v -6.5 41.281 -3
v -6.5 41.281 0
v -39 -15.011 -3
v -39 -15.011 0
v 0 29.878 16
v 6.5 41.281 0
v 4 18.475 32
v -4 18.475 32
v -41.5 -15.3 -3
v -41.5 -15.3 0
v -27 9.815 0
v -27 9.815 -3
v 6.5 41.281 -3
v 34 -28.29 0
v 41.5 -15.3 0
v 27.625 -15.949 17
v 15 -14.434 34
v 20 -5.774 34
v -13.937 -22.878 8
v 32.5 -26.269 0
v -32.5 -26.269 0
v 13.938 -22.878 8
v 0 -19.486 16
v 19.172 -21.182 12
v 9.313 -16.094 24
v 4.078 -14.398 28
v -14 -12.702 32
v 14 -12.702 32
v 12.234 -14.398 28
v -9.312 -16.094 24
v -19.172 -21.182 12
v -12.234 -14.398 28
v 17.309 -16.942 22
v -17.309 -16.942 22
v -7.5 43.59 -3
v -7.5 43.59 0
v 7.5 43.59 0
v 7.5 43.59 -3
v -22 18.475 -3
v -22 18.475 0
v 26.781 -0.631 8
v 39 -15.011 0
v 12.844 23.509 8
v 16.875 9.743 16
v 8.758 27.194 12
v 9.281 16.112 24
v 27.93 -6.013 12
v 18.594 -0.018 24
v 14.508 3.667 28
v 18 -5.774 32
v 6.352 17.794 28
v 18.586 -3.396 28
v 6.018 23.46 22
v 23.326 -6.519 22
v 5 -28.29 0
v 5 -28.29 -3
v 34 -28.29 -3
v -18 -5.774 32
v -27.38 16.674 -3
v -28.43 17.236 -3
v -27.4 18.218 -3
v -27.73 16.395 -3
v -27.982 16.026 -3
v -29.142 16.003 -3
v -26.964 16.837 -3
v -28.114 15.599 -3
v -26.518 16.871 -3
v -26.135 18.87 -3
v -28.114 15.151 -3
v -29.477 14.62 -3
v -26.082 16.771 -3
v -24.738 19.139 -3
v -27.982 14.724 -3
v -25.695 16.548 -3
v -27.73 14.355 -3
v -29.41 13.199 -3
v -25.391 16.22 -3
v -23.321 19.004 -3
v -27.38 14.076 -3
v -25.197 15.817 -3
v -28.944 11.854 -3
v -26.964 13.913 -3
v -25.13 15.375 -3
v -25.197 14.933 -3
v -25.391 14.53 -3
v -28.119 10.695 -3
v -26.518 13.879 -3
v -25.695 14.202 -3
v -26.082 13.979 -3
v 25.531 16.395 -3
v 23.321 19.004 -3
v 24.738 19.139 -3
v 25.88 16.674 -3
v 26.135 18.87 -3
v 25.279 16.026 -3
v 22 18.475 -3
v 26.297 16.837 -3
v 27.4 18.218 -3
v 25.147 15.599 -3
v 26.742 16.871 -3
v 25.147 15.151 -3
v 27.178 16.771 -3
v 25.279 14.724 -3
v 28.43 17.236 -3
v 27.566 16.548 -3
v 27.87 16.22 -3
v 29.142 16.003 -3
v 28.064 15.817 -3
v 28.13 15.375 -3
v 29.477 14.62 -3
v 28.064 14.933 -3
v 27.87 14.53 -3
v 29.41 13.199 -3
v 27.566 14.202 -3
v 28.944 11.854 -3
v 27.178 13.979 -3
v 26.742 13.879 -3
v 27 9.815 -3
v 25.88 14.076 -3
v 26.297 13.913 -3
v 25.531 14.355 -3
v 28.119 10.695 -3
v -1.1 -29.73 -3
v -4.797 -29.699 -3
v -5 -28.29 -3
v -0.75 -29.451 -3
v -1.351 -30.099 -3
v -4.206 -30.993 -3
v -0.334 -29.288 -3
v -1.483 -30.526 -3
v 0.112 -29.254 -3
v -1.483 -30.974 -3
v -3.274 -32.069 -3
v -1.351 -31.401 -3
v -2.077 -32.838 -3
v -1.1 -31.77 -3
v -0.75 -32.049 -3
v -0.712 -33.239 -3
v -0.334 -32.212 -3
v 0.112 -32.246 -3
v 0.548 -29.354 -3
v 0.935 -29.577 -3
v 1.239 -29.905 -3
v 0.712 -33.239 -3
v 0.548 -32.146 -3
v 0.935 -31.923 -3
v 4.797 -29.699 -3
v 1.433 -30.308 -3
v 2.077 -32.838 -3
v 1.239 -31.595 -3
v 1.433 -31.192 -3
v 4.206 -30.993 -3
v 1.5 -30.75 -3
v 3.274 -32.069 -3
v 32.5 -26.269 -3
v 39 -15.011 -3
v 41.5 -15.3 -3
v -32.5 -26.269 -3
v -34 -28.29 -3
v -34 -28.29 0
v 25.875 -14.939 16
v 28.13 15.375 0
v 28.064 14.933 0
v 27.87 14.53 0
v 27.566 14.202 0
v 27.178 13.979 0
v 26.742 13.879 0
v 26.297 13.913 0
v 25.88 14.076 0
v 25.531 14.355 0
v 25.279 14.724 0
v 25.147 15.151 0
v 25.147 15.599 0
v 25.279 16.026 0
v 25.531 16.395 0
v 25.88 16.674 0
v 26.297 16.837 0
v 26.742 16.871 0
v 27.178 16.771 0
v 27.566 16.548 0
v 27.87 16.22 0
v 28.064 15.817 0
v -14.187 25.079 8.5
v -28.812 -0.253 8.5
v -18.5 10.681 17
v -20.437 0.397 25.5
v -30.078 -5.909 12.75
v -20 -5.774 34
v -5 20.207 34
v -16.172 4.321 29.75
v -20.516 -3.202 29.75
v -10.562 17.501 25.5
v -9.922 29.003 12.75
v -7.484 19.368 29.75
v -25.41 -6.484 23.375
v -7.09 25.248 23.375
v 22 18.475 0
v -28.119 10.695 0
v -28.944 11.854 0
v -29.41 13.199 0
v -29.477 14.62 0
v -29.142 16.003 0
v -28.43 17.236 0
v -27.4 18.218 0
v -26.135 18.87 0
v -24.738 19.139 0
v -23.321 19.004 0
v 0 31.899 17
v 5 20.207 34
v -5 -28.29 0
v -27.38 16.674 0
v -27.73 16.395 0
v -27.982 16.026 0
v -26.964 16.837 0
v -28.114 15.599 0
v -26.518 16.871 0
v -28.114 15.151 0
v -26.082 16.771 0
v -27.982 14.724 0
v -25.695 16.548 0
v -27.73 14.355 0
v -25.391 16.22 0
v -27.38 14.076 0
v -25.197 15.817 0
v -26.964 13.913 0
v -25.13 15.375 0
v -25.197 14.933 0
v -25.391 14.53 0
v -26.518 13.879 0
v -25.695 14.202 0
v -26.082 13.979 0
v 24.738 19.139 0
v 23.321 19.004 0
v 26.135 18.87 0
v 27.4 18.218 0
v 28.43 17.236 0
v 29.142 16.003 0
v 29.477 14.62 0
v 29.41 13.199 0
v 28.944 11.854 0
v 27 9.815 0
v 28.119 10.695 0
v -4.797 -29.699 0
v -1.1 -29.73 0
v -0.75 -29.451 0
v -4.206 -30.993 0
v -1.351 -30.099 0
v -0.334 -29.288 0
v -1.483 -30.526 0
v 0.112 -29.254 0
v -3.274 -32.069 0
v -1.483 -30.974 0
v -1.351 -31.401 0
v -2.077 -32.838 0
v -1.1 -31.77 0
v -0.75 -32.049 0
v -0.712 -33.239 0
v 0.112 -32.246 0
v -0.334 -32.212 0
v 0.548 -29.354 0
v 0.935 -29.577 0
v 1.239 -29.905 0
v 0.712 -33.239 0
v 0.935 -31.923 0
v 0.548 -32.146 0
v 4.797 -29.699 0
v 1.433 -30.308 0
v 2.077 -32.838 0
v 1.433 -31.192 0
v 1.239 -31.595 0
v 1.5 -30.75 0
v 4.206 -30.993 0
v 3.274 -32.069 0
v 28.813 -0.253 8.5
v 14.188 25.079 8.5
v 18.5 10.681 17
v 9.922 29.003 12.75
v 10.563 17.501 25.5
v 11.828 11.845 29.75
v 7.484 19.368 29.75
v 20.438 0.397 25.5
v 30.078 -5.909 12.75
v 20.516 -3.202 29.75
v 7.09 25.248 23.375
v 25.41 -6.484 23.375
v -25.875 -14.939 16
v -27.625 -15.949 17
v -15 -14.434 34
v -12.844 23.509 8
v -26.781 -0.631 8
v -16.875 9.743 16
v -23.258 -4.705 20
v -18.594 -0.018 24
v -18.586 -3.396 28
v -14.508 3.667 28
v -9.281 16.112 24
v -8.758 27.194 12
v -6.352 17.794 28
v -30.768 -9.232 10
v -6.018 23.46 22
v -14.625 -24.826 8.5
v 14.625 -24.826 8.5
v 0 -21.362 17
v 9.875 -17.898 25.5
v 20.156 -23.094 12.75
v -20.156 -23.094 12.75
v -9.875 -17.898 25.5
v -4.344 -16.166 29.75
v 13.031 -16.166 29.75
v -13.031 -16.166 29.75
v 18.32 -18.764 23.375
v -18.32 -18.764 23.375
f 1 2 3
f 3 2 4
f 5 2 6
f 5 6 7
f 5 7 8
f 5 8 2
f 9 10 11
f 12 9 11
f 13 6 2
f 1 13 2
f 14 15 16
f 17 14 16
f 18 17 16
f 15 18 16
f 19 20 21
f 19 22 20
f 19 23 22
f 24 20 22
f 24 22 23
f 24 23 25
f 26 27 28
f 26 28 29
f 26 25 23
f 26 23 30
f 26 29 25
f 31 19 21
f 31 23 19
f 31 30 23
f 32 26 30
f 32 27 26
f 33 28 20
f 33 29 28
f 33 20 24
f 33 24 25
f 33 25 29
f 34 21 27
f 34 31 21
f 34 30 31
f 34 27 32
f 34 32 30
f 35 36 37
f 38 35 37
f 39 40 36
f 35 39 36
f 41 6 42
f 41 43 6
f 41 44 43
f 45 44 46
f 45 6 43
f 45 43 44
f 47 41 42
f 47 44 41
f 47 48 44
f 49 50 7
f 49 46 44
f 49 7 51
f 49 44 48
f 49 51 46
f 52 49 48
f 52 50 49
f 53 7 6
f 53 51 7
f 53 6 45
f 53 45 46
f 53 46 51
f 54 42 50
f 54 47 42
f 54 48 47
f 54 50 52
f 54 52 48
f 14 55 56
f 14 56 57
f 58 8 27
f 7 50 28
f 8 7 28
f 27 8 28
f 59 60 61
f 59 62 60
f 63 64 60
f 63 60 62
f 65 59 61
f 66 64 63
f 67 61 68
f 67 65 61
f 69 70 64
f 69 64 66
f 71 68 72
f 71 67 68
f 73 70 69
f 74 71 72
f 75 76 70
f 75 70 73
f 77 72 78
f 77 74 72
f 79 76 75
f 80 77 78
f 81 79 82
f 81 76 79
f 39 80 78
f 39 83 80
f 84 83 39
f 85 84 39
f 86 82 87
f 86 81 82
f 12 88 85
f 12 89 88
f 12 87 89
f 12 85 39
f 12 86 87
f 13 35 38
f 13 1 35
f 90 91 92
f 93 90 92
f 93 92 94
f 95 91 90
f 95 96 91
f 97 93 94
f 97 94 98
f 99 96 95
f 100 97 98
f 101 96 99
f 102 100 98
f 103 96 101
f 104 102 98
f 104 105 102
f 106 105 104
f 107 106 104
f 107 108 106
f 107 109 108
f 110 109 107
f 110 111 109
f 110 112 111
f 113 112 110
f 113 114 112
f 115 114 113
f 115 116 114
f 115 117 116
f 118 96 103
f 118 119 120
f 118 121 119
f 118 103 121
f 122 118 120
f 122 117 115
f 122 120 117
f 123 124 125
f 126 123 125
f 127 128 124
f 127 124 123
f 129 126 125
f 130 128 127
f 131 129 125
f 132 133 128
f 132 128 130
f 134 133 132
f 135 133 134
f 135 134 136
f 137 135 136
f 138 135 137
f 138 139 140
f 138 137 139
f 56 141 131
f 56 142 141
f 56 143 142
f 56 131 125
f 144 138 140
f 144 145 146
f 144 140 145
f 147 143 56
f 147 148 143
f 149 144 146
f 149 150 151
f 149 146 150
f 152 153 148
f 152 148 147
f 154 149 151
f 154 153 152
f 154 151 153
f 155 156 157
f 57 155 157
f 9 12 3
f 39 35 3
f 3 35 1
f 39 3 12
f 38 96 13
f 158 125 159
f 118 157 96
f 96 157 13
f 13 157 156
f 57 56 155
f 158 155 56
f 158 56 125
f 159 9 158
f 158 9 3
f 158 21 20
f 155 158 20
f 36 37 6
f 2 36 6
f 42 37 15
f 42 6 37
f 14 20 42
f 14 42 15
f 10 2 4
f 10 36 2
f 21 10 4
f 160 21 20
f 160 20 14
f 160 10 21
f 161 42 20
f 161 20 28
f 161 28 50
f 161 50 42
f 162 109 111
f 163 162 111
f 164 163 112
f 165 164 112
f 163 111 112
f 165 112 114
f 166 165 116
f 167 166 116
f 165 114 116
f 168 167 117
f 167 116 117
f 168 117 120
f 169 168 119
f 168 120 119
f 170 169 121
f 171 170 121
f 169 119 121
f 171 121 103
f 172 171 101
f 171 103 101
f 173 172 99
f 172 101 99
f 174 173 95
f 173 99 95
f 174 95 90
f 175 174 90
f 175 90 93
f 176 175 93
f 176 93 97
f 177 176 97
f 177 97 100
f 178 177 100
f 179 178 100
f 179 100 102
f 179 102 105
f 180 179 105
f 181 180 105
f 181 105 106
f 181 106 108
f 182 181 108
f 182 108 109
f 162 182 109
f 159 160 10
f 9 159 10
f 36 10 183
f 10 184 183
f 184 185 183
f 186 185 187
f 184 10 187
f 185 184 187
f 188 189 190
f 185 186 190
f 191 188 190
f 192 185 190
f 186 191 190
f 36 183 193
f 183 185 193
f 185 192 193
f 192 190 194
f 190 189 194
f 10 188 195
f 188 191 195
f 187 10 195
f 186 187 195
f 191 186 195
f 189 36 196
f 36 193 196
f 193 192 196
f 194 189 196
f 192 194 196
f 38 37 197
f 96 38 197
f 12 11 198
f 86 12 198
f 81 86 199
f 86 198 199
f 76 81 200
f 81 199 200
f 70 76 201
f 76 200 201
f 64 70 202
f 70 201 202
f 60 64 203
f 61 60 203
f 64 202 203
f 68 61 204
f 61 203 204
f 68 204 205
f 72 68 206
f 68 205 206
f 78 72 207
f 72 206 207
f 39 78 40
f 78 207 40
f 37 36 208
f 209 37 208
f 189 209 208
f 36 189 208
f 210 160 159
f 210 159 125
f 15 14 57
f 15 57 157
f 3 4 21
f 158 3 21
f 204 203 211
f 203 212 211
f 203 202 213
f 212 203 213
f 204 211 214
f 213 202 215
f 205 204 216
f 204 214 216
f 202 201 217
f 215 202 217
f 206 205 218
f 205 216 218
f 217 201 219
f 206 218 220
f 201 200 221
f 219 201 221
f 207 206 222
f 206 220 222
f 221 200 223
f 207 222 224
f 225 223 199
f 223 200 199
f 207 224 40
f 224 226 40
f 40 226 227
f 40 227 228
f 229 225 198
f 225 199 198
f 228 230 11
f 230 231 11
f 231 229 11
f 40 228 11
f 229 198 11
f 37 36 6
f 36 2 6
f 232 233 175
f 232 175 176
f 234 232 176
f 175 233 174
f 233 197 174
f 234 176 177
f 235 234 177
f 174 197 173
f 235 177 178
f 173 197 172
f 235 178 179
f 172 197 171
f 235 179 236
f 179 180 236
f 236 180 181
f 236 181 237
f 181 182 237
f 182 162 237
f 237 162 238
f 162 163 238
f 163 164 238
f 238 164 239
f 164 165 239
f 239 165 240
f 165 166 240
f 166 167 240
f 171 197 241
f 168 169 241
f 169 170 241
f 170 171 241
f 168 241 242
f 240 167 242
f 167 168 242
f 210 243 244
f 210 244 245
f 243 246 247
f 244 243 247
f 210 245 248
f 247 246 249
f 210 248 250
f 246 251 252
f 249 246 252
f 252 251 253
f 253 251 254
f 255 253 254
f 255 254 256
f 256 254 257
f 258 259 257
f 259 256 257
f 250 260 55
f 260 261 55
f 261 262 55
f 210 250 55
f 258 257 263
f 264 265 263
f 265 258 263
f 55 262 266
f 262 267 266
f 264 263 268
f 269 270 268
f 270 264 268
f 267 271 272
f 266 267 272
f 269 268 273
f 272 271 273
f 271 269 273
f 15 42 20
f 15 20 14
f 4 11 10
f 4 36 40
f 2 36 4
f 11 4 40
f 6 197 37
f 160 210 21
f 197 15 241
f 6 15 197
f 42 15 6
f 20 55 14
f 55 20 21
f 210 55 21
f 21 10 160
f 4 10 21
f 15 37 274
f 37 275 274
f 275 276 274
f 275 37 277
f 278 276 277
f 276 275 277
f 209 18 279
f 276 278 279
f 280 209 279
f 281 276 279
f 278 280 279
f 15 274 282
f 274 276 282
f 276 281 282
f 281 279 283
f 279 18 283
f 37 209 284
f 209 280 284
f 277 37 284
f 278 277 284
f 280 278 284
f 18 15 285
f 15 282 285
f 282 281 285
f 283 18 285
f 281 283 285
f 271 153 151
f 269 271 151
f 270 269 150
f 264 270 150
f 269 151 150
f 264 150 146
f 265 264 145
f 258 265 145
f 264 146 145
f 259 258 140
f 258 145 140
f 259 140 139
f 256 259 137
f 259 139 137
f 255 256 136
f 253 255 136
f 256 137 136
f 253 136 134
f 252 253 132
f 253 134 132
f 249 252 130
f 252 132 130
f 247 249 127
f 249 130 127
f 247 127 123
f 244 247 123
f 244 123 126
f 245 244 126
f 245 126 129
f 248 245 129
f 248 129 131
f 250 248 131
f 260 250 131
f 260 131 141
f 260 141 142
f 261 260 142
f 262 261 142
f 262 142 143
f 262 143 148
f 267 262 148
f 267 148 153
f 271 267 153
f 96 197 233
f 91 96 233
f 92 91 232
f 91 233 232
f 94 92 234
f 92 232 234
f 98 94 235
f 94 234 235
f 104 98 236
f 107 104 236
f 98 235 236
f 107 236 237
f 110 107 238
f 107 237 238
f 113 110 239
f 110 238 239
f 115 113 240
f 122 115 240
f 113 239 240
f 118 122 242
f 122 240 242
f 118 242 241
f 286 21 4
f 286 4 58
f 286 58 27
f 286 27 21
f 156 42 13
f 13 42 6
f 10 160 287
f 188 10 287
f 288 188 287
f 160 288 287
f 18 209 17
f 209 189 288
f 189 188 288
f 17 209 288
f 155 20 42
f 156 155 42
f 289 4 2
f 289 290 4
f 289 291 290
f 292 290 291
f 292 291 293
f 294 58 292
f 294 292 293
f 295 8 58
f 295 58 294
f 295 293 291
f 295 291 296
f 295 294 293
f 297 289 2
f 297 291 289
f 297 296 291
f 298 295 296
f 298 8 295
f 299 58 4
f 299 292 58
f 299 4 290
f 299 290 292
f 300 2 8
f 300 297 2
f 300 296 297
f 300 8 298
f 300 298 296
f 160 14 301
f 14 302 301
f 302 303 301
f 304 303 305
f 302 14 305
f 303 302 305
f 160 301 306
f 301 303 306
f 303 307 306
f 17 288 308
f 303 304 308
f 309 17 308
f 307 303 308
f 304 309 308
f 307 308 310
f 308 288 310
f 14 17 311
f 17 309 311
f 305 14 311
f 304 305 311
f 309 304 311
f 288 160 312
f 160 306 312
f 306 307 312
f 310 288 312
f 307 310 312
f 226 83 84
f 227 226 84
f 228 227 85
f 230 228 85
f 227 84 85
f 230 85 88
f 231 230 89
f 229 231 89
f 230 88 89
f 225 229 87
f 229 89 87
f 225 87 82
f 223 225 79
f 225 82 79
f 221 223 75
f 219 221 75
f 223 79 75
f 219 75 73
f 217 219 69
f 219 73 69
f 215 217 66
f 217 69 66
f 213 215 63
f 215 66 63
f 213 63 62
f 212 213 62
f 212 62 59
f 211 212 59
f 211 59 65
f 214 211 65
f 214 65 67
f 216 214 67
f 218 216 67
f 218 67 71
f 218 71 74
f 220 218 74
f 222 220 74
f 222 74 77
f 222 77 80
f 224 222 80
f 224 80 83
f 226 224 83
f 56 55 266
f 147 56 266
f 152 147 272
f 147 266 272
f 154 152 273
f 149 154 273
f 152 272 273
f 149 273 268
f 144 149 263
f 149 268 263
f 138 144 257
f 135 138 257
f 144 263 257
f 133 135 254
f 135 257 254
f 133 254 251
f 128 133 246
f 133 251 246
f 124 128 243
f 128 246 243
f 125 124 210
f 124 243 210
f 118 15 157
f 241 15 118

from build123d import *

# Parameters (mm, degrees)
PAD_DEPTH    = 3
SKETCH005_R  = 1.5
POCKET_DEPTH = 5


with BuildPart() as loft001:
    # Sketch001 → Loft001 section 0
    with BuildSketch(Plane.XY):
        Polygon((-6.500001, 41.280544), (6.499999, 41.280544), (39, -15.011106), (32.500001, -26.269437), (-32.499999, -26.269437), (-39, -15.011108), align=None)
    # Sketch003 → Loft001 section 1
    with BuildSketch(Plane.XY.offset(32)):
        Polygon((-4, 18.475209), (-18.000001, -5.773502), (-14, -12.701705), (14, -12.701705), (18.000001, -5.773502), (4, 18.475209), align=None)
    loft()


with BuildPart() as cut:
    # Sketch → Loft section 0
    with BuildSketch(Plane.XY):
        Polygon((-7.499995, 43.589943), (7.500005, 43.589943), (41.500006, -15.299784), (34.000005, -28.290164), (-33.999995, -28.290164), (-41.499996, -15.299784), align=None)
    # Sketch002 → Loft section 1
    with BuildSketch(Plane.XY.offset(34)):
        Polygon((-5, 20.207257), (5, 20.207257), (20.000001, -5.773505), (15, -14.433759), (-15, -14.433759), (-20.000001, -5.773505), align=None)
    loft()

    # Cut: cut Loft001
    add(loft001.part, mode=Mode.SUBTRACT)


with BuildPart() as pocket:
    # Sketch004 → Pad (new body)
    with BuildSketch(Plane(origin=(0, 0, 0), x_dir=(1, 0, 0), z_dir=(0, 0, -1))):
        with BuildLine():
            Line((-34, 28.290167), (-41.500001, 15.299787))
            Line((-41.500001, 15.299787), (-27.000001, -9.814949))
            ThreePointArc((-27.000001, -9.814949), (-28.830149, -16.645089), (-22, -18.475203))
            Line((-22, -18.475203), (-7.5, -43.58994))
            Line((-7.5, -43.58994), (7.5, -43.58994))
            Line((7.5, -43.58994), (22, -18.475203))
            ThreePointArc((22, -18.475203), (28.830128, -16.645077), (27.000001, -9.814949))
            Line((41.500001, 15.299787), (27.000001, -9.814949))
            Line((34, 28.290167), (41.500001, 15.299787))
            Line((5, 28.290167), (34, 28.290167))
            ThreePointArc((5, 28.290167), (0, 33.290167), (-5, 28.290167))
            Line((-34, 28.290167), (-5, 28.290167))
        make_face()
        Polygon((-32.5, 26.269436), (32.5, 26.269436), (39.000001, 15.011106), (6.5, -41.280545), (-6.5, -41.280545), (-39.000001, 15.011106), align=None, mode=Mode.SUBTRACT)
    extrude(amount=PAD_DEPTH)

    # Sketch005 → Pocket (cut)
    with BuildSketch(Plane(origin=(0, 0, -3), x_dir=(1, 0, 0), z_dir=(0, 0, -1))):
        with Locations((0, 30.75)):
            Circle(SKETCH005_R)
        with Locations((26.630283, -15.374997)):
            Circle(SKETCH005_R)
        with Locations((-26.630283, -15.374997)):
            Circle(SKETCH005_R)
    extrude(amount=-POCKET_DEPTH, mode=Mode.SUBTRACT)


solid = Compound([cut.part, pocket.part])
